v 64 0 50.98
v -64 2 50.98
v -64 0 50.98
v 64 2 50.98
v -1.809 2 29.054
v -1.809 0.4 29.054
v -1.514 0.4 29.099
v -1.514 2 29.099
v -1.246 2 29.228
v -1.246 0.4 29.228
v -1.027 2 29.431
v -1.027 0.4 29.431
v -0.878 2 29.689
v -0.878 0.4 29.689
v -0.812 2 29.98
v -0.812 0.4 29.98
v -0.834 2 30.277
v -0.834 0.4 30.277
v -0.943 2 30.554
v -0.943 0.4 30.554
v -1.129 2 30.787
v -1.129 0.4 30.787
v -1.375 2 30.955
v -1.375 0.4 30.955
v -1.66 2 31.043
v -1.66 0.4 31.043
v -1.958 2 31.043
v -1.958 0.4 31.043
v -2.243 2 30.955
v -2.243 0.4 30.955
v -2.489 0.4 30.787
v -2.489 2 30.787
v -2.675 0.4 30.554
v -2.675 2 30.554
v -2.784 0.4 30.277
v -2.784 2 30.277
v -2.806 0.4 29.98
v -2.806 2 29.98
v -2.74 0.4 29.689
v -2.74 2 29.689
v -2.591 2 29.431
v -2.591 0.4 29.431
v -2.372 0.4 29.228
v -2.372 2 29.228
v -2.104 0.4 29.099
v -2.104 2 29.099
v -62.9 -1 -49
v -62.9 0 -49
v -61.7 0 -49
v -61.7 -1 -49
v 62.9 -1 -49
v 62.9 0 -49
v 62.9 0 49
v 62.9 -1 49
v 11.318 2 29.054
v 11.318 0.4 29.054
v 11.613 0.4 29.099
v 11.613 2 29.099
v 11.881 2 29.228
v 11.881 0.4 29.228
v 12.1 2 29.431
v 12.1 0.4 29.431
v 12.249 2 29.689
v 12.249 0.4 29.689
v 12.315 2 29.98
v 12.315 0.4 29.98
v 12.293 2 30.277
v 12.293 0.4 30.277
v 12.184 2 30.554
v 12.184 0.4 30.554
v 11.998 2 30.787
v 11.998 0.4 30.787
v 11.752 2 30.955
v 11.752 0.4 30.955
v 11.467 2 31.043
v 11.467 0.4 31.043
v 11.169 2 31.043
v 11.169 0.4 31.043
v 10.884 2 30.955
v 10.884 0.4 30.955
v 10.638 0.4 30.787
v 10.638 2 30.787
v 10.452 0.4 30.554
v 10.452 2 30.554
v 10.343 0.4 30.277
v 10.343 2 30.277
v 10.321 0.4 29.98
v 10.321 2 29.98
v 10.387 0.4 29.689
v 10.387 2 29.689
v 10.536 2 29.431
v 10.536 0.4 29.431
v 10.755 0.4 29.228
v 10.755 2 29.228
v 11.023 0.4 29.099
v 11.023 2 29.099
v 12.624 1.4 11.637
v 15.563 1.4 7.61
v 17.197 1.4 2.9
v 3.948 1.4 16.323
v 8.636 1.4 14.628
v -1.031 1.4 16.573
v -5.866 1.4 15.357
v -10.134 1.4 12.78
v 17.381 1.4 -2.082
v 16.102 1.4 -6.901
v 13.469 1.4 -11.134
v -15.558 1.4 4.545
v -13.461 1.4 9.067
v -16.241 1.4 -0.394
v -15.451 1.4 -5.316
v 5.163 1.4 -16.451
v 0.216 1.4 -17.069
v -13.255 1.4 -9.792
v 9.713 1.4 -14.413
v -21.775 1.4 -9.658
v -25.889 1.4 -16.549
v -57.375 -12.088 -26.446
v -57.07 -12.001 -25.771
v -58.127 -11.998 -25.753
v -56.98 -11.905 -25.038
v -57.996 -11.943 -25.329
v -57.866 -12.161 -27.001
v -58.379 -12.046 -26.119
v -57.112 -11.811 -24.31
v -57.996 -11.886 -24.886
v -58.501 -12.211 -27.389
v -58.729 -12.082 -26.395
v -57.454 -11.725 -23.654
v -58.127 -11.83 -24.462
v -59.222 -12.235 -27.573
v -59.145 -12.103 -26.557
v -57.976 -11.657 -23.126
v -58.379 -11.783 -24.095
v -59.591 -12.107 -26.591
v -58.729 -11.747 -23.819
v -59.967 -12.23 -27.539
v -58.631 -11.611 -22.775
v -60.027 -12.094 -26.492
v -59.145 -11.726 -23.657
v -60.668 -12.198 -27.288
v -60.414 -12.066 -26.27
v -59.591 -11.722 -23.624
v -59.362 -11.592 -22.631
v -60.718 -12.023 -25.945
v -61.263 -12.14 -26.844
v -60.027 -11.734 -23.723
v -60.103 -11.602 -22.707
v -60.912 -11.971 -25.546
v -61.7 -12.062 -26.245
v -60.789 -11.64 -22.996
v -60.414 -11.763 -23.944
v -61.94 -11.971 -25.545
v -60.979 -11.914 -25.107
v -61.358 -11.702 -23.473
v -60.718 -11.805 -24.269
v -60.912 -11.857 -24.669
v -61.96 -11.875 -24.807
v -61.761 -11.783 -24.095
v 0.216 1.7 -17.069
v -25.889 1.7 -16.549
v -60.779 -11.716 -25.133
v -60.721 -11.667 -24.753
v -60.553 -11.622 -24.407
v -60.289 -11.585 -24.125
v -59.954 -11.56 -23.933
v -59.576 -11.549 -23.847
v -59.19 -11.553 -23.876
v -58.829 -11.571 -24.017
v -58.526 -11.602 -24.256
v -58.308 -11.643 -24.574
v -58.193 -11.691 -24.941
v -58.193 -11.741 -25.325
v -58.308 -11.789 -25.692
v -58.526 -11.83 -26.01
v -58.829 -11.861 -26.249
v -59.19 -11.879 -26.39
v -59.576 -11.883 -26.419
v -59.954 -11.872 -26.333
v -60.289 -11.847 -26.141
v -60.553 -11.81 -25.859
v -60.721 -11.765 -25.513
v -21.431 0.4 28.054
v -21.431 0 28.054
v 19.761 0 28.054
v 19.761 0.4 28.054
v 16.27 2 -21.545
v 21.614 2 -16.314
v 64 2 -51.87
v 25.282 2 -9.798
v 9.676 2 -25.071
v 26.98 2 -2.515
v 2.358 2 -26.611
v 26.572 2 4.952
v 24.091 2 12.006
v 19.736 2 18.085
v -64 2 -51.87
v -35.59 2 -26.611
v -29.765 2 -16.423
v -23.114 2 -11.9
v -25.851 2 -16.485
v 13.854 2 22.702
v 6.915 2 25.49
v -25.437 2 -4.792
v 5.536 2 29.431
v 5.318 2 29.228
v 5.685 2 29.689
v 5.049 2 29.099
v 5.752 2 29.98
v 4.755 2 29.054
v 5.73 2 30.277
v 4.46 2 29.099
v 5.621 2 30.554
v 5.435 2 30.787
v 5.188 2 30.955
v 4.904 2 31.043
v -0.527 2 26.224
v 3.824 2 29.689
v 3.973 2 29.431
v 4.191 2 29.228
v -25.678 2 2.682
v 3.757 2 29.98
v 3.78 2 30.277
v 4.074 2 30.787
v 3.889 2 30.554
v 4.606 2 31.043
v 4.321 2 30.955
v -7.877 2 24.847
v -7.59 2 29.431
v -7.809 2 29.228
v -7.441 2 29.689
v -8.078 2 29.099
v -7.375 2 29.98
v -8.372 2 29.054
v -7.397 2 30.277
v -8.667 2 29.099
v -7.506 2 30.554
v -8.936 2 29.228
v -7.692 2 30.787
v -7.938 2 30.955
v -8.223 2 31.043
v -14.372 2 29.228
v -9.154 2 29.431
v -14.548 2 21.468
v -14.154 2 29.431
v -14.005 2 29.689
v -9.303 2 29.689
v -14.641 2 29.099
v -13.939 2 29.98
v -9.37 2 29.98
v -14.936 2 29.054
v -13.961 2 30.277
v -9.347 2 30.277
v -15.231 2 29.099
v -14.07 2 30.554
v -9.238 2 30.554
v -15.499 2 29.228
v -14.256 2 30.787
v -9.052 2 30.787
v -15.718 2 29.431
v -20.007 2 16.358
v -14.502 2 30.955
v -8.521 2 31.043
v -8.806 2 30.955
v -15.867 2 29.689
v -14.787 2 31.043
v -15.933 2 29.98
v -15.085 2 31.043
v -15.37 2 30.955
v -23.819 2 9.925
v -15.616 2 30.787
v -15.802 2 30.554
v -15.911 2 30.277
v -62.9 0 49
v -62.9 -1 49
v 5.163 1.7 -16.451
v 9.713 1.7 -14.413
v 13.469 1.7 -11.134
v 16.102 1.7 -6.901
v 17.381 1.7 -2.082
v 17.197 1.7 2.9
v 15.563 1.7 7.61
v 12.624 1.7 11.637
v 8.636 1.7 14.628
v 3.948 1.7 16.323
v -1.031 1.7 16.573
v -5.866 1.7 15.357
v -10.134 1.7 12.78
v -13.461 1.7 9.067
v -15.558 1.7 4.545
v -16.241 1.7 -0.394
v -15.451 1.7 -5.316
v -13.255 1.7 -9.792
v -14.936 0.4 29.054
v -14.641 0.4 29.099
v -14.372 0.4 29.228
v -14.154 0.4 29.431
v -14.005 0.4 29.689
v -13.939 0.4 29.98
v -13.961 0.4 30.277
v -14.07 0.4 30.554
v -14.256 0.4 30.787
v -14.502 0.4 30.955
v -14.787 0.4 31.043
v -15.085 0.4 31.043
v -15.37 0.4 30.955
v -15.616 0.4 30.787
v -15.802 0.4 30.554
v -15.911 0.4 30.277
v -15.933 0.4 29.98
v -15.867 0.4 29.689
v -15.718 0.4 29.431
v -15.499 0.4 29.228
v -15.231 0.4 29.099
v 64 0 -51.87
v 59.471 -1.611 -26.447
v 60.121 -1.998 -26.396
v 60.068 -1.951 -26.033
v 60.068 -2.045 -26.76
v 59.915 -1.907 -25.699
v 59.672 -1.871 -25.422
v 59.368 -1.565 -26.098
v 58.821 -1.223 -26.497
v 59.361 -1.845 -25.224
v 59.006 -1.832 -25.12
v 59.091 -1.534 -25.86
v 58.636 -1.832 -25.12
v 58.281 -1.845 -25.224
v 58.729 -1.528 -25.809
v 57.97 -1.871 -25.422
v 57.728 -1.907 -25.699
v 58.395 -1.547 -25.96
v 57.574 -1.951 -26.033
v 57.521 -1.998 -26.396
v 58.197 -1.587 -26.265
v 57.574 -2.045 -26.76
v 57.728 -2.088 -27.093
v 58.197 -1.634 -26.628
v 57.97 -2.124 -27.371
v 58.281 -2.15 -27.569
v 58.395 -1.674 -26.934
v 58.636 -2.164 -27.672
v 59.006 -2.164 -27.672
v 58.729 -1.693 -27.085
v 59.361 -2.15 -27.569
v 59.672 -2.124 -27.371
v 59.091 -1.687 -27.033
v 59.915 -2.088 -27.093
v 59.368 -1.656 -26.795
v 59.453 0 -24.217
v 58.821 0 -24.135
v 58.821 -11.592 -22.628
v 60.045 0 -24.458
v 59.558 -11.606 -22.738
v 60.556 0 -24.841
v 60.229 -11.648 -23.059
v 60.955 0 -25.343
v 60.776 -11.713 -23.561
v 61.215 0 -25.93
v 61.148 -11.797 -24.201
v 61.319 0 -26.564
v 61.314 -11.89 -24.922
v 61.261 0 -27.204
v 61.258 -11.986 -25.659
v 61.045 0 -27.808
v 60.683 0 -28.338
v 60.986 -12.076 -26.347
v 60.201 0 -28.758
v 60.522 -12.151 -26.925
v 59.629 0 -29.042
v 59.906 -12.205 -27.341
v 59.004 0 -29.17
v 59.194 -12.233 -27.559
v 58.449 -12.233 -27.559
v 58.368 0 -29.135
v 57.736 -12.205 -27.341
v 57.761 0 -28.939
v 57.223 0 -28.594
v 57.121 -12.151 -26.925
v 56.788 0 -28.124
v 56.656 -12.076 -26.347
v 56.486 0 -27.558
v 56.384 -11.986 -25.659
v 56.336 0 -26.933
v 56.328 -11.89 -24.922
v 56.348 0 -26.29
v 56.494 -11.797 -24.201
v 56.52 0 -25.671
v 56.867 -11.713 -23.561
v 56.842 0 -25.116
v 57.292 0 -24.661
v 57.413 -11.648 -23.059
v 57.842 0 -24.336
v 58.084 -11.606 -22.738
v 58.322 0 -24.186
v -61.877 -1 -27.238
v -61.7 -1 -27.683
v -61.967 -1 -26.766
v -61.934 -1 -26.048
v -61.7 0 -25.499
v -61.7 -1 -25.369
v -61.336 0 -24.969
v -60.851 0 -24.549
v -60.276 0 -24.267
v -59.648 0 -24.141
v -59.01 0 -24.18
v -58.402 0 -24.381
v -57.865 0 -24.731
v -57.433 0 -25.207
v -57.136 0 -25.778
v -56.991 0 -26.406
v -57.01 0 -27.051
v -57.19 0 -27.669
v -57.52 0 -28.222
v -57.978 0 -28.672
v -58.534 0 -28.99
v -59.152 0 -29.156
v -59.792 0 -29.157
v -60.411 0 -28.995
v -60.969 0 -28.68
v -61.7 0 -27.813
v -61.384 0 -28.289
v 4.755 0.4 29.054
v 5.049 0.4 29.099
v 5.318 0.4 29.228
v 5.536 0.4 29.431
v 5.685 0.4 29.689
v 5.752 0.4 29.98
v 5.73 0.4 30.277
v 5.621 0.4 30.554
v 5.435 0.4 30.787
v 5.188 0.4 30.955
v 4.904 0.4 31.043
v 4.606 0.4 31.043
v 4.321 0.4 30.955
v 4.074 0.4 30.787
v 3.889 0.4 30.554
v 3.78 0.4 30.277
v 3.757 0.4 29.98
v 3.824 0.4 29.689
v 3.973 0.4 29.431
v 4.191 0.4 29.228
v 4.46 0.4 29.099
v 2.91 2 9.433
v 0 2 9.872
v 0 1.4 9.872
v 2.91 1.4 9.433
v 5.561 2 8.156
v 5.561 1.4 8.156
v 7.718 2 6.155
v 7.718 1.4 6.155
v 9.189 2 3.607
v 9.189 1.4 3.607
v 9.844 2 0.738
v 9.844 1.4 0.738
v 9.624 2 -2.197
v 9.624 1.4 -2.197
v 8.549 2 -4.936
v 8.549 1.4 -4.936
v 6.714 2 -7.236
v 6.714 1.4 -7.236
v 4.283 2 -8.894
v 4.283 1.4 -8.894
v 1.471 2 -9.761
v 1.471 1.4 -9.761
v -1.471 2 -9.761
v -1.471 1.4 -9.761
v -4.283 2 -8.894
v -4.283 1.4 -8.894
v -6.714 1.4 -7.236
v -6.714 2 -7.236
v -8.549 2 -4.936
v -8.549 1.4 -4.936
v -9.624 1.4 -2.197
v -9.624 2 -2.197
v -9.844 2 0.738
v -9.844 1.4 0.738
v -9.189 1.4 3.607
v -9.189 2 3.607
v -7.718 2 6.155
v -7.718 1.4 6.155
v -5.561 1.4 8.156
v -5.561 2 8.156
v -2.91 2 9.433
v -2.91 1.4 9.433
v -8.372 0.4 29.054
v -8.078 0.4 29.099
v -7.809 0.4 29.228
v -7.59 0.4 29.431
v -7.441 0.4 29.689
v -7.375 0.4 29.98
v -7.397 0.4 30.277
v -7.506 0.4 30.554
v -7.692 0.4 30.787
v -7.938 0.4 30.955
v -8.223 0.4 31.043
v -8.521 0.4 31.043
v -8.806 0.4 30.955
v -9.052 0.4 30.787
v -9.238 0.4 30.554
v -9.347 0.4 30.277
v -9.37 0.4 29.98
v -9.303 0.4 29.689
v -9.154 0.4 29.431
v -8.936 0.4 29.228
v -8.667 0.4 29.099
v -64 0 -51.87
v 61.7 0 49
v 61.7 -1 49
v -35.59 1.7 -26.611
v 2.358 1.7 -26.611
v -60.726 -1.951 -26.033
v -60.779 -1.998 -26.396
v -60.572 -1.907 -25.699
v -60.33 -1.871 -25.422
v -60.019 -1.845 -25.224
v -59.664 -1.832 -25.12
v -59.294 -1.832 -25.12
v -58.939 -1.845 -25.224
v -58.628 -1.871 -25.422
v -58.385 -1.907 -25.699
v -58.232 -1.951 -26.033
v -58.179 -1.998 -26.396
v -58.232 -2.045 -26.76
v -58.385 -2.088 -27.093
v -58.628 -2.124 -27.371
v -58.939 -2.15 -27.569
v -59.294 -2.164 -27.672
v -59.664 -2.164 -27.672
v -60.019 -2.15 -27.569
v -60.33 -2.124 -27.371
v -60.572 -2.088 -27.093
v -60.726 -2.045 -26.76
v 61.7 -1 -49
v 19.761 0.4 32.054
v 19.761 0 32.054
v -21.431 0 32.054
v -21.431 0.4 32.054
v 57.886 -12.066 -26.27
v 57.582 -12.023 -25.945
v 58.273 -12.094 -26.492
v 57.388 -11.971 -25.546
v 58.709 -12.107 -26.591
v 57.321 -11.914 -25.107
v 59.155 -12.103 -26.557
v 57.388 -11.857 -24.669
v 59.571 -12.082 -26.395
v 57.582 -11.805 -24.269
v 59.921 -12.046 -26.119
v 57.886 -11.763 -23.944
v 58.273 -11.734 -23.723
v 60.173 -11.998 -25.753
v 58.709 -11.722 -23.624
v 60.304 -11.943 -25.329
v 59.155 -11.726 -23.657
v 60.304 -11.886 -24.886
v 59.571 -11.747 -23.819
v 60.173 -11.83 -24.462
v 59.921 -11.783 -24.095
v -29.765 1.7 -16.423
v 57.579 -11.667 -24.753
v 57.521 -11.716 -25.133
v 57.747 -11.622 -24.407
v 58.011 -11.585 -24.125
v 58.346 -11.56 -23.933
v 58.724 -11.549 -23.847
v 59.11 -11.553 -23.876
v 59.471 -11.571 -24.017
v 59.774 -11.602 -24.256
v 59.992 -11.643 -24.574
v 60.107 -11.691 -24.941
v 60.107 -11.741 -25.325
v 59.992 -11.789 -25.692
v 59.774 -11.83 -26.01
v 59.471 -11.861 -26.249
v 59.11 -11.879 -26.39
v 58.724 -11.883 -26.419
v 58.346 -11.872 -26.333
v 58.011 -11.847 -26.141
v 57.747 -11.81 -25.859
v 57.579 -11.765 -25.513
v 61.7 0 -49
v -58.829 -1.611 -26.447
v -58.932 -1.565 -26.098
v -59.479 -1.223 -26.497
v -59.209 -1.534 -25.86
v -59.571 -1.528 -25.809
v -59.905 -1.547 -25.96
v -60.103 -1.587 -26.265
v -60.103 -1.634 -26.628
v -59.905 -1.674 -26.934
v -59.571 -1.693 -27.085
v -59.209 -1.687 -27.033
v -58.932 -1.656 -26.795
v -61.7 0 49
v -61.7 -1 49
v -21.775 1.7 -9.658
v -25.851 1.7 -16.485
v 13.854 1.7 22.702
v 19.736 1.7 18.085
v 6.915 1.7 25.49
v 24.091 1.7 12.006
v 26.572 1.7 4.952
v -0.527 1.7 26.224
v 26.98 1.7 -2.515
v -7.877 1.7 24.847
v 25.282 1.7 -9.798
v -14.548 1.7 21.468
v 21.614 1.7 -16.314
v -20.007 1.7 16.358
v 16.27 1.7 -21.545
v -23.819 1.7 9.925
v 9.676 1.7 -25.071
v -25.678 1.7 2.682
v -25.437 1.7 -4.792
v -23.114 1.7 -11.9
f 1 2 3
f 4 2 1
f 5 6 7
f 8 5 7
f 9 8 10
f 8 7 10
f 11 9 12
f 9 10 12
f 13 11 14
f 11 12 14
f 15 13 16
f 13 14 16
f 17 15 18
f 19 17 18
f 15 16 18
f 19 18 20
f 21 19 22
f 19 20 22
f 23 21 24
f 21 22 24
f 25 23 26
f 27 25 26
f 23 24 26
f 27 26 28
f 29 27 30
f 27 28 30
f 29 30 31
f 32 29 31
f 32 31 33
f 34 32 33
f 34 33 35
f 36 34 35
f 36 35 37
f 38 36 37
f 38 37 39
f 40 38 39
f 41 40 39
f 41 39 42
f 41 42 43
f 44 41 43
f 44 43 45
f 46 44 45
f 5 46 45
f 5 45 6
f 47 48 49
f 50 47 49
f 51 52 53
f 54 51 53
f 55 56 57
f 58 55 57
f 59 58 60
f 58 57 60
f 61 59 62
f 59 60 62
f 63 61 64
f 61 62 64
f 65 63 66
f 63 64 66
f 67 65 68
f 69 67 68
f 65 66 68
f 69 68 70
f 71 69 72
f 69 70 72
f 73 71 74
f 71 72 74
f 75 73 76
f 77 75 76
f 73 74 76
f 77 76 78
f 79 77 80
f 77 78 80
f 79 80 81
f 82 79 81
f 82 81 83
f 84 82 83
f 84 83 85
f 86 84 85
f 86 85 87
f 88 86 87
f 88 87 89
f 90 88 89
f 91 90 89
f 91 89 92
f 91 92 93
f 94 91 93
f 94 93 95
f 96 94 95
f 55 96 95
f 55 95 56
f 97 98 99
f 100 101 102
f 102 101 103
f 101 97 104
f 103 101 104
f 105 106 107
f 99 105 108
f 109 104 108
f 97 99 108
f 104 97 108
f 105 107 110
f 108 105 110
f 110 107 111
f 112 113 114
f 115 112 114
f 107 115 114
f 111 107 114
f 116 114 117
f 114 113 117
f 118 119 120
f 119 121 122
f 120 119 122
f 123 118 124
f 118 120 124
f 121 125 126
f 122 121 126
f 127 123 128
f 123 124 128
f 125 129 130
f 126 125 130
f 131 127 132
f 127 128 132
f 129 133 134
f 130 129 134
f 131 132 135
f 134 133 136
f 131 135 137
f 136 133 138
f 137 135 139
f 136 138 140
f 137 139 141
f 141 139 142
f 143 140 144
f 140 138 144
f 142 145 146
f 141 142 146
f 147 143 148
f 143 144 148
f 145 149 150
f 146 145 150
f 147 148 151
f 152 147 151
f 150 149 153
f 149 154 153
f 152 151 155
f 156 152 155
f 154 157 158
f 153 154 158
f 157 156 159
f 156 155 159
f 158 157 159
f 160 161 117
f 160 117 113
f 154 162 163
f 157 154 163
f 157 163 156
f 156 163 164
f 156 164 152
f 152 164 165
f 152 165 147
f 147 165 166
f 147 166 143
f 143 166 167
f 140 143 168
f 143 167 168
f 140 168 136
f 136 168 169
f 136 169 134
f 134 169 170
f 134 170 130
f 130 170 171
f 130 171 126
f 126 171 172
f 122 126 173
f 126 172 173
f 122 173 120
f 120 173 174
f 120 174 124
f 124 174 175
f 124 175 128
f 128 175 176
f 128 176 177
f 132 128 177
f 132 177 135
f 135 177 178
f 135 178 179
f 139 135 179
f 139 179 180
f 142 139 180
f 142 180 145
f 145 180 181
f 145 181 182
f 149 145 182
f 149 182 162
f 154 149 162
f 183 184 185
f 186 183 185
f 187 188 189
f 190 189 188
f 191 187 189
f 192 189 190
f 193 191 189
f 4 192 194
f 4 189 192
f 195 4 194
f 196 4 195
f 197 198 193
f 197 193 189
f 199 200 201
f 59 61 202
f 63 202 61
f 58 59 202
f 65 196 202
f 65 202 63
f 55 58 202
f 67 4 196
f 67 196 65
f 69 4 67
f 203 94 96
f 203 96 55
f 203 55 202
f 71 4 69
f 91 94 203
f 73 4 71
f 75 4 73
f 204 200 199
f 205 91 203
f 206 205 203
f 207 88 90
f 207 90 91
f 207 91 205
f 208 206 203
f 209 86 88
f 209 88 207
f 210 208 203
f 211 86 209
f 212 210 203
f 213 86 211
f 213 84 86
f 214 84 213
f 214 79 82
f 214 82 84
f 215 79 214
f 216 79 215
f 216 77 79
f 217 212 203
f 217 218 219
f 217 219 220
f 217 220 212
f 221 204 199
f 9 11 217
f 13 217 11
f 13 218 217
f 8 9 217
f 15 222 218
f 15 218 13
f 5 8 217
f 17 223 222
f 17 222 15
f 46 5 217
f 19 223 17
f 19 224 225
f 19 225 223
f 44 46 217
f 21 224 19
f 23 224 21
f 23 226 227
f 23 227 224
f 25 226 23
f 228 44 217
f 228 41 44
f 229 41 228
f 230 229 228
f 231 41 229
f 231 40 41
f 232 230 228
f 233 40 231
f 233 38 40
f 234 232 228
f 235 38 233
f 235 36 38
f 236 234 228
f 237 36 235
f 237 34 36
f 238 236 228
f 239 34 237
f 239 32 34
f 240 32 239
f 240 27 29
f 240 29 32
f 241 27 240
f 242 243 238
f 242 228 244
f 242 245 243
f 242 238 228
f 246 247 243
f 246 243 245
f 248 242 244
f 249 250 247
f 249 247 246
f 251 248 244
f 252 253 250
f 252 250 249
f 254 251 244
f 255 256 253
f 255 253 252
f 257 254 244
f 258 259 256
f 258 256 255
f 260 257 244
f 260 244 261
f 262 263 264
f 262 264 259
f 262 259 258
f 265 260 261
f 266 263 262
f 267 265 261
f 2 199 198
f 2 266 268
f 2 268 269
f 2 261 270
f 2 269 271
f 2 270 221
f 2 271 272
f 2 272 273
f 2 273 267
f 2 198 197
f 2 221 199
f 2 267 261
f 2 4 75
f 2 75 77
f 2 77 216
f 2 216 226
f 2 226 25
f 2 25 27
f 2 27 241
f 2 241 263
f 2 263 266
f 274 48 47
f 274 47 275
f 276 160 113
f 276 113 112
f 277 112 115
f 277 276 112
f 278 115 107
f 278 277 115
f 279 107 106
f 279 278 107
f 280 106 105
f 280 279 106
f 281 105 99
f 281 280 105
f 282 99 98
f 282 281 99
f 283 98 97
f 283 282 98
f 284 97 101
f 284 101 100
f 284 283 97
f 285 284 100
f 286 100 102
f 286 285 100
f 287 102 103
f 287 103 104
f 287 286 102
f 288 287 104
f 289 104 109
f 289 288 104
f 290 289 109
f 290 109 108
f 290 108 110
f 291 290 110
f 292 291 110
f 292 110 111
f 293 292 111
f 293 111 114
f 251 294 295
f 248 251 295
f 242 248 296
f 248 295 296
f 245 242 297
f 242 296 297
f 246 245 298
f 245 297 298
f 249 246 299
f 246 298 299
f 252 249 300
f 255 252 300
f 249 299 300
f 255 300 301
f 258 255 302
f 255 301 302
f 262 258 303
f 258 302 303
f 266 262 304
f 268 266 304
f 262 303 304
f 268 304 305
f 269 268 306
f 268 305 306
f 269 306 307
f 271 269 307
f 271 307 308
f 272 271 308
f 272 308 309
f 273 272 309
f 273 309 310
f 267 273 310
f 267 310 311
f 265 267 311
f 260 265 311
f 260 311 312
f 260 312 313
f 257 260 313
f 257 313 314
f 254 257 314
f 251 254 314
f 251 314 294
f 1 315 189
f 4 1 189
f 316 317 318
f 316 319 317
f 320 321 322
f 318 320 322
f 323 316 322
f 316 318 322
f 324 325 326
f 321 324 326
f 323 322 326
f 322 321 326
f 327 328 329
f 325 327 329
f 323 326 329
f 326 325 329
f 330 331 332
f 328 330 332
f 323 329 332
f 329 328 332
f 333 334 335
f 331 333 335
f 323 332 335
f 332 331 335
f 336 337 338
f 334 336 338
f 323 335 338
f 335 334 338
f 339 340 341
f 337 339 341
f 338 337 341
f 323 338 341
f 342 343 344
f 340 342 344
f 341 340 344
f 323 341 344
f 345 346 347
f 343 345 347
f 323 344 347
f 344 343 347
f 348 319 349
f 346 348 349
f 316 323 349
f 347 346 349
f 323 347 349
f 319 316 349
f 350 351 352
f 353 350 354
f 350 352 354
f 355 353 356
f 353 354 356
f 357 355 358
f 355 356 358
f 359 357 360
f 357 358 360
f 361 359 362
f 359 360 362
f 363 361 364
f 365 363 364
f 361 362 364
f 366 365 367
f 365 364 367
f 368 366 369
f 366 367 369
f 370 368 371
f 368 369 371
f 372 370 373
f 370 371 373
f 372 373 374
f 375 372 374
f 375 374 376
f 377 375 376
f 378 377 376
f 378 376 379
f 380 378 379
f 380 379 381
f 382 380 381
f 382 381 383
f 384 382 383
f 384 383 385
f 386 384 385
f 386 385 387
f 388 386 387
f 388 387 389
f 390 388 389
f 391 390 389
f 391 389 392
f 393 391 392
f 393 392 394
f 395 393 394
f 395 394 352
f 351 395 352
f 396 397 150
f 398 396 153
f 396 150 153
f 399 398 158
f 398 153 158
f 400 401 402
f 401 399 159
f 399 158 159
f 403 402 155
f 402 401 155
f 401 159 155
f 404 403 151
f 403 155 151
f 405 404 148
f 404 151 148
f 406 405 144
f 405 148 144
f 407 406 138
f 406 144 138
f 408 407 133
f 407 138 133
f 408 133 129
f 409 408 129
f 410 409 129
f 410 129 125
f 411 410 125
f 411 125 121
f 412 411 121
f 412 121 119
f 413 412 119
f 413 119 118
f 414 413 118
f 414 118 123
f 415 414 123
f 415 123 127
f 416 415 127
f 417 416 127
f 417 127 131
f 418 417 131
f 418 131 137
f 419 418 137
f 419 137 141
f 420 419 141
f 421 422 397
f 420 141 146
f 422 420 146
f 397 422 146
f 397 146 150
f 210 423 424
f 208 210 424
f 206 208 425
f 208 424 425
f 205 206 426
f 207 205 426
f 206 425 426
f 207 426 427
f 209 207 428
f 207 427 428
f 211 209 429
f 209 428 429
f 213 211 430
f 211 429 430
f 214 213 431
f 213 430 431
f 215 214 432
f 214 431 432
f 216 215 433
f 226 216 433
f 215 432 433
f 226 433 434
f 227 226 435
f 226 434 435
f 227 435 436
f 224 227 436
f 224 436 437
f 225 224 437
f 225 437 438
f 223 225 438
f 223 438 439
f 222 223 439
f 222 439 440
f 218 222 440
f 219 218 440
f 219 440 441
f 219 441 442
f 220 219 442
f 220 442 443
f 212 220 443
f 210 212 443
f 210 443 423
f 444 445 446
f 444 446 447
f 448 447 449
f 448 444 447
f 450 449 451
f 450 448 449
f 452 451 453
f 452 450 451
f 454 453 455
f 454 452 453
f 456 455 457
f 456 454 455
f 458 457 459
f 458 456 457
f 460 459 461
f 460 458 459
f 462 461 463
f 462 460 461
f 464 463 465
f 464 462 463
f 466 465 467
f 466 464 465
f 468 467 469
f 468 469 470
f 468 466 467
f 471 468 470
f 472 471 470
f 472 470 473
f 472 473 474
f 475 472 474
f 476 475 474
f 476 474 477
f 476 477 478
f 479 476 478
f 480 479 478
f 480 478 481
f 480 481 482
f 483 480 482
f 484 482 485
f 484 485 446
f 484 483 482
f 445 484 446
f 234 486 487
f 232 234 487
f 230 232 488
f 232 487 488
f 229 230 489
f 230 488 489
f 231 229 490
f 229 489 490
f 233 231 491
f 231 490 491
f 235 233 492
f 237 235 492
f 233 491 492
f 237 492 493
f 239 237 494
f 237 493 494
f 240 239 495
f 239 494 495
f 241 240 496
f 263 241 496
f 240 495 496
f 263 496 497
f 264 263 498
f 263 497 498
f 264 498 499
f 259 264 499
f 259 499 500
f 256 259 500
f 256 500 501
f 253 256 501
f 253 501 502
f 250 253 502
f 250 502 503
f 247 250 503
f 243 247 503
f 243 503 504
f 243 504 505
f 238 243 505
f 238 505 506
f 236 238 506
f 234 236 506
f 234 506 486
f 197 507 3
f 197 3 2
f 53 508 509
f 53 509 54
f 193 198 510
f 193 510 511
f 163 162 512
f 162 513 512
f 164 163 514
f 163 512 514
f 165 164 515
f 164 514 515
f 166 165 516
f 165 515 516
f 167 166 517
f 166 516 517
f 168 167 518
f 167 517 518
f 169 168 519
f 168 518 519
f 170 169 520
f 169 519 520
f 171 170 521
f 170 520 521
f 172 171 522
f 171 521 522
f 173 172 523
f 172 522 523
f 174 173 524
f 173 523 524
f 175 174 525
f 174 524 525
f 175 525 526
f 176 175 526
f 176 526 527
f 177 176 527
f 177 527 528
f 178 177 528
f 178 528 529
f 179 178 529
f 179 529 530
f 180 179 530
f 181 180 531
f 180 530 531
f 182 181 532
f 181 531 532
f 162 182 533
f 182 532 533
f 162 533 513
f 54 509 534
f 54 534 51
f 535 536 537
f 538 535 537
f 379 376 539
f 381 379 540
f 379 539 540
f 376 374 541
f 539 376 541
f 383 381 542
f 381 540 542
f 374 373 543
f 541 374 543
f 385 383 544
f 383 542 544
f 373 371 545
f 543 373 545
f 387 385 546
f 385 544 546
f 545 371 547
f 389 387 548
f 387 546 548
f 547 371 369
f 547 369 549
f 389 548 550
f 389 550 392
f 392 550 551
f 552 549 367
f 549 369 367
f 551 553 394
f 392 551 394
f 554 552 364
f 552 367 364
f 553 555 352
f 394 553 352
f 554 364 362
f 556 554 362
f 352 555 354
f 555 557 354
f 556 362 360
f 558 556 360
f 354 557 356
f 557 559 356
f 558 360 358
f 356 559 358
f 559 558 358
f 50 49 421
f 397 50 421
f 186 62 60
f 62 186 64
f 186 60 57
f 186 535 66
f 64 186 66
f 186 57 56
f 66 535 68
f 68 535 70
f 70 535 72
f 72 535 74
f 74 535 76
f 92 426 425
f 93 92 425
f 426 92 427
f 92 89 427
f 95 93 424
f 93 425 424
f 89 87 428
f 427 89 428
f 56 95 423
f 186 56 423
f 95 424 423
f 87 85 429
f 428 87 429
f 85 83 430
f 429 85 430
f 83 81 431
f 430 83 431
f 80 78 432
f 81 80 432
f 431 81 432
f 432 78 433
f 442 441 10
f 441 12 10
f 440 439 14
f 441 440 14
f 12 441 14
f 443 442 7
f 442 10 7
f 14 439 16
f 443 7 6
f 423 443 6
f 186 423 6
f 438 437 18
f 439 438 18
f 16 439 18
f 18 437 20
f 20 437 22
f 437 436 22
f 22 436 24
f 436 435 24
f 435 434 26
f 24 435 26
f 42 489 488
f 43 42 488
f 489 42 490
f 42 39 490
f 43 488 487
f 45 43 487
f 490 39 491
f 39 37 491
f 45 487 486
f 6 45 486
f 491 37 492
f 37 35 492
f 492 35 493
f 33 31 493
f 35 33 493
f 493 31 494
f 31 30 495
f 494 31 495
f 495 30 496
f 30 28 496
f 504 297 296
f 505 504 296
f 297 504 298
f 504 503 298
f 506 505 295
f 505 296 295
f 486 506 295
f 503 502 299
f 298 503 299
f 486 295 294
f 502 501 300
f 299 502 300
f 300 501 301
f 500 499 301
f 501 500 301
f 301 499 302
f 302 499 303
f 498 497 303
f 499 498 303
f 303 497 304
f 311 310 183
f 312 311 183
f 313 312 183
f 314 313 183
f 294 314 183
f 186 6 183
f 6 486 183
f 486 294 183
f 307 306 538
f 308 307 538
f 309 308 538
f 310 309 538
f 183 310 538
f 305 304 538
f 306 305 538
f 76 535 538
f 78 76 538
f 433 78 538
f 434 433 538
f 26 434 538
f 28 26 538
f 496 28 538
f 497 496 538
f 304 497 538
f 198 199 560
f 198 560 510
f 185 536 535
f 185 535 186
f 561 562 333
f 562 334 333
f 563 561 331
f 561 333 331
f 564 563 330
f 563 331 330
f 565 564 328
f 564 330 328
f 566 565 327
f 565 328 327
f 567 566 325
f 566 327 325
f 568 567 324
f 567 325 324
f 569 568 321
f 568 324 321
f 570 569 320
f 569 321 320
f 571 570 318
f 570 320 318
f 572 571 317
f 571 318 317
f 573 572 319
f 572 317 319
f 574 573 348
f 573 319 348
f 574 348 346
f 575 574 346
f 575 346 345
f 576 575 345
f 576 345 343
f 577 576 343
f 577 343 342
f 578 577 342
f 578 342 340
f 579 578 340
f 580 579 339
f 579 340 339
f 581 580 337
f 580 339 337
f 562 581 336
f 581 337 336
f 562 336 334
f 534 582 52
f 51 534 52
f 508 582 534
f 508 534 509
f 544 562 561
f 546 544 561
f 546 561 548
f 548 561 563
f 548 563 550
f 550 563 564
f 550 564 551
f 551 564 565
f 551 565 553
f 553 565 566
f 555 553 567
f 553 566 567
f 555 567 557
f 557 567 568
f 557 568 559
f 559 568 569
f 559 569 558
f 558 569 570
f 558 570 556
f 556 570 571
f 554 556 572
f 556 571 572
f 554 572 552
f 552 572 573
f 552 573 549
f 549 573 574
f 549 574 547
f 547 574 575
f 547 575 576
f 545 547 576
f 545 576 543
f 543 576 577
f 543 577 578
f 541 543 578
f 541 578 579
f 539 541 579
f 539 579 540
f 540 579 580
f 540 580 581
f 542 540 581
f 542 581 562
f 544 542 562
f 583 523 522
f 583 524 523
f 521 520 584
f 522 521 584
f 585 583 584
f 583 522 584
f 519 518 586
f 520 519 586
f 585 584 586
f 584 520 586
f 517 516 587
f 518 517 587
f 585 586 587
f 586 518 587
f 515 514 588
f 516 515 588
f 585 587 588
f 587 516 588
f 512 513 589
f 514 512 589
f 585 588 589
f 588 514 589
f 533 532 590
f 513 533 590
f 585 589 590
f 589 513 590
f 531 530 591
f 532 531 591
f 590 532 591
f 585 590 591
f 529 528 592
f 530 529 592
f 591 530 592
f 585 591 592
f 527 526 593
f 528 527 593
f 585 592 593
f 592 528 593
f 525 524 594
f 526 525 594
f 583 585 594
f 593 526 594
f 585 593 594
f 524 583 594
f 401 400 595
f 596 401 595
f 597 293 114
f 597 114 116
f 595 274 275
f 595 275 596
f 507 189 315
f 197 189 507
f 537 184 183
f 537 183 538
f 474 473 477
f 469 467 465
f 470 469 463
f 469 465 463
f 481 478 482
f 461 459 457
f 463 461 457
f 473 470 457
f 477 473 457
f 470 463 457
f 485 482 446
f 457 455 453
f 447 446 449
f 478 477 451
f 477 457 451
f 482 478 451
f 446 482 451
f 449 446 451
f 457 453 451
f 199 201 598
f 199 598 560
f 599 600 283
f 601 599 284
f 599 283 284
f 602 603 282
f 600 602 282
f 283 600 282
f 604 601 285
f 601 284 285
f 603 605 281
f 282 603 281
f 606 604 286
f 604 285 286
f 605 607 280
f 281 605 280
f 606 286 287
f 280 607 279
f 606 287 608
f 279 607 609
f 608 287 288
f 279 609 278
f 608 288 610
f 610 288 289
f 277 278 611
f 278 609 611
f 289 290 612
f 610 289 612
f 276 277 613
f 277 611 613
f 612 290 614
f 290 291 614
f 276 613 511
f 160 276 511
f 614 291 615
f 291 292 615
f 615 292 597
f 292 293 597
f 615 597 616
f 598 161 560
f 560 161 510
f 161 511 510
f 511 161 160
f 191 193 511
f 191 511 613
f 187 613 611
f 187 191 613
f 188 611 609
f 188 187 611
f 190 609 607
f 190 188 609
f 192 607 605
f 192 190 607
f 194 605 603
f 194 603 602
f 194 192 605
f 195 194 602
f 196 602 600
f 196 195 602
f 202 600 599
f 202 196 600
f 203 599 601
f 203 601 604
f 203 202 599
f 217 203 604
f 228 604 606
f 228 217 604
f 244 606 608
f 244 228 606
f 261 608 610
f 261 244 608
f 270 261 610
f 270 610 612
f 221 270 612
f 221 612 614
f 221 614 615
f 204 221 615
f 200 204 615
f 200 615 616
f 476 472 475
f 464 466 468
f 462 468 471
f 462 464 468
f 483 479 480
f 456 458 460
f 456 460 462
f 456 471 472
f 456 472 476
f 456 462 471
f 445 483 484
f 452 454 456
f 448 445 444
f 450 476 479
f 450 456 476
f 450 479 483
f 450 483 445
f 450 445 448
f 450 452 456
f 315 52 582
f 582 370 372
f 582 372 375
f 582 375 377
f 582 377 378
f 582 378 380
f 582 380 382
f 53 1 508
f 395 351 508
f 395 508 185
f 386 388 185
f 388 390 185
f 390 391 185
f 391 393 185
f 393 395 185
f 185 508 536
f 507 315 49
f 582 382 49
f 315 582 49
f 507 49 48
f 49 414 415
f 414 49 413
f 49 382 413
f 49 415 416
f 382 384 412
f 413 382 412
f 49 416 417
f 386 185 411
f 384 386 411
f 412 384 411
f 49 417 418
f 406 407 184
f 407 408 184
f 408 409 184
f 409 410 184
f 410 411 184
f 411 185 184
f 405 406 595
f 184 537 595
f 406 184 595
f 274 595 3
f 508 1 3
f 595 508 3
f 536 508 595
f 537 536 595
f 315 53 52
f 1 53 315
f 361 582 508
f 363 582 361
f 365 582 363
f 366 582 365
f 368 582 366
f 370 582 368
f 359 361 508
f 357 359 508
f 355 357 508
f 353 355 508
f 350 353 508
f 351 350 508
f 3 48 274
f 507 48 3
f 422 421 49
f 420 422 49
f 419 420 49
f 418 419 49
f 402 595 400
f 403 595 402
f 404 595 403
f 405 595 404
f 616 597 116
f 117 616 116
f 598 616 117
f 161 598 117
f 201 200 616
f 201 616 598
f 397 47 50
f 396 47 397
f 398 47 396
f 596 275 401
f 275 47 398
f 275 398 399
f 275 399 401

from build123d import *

# Parameters (mm, degrees)
SKETCH1_W                      = 128
SKETCH1_H                      = 101
BOSS_EXTRUDE1_DEPTH            = 2
SKETCH2_W                      = 1.2
SKETCH2_H                      = 98
BOSS_EXTRUDE2_DEPTH            = 1
SKETCH3_W                      = 128
SKETCH3_H                      = 2
BOSS_EXTRUDE3_DEPTH            = 0.48
SKETCH4_W                      = 128
SKETCH4_H                      = 2
BOSS_EXTRUDE4_DEPTH            = 1.37
BOSS_EXTRUDE5_START            = 2
SKETCH5_R                      = 2.5
BOSS_EXTRUDE5_DEPTH            = 13
M3_CLEARANCE_HOLE1_D           = 2.6
M3_CLEARANCE_HOLE1_DEPTH       = 10
M3_CLEARANCE_HOLE1_CSINK_D     = 3
M3_CLEARANCE_HOLE1_CSINK_ANGLE = 90
M3_CLEARANCE_HOLE1_TIP         = 0.781118805
M3_CLEARANCE_HOLE2_D           = 2.6
M3_CLEARANCE_HOLE2_DEPTH       = 10
M3_CLEARANCE_HOLE2_CSINK_D     = 3
M3_CLEARANCE_HOLE2_CSINK_ANGLE = 90
M3_CLEARANCE_HOLE2_TIP         = 0.781118805
SKETCH14_R                     = 1
CUT_EXTRUDE1_DEPTH             = 5
CUT_EXTRUDE2_DEPTH             = 0.4
CUT_EXTRUDE4_DEPTH             = 0.3
CUT_EXTRUDE5_DEPTH             = 0.6
SKETCH30_R                     = 9.871633986
BOSS_EXTRUDE13_DEPTH           = 0.6


with BuildPart() as part:
    # Sketch1 → Boss-Extrude1 (new body)
    with BuildSketch(Plane(origin=(0, 0, 0), x_dir=(1, 0, 0), z_dir=(0, 1, 0))):
        Rectangle(SKETCH1_W, SKETCH1_H)
    extrude(amount=BOSS_EXTRUDE1_DEPTH)

    # Sketch2 → Boss-Extrude2 (add)
    with BuildSketch(Plane.XZ):
        with Locations((62.3, 0)):
            Rectangle(SKETCH2_W, SKETCH2_H)
        with Locations((-62.3, 0)):
            Rectangle(SKETCH2_W, SKETCH2_H)
    extrude(amount=BOSS_EXTRUDE2_DEPTH)

    # Sketch3 → Boss-Extrude3 (add)
    with BuildSketch(Plane.XY.offset(50.5)):
        with Locations((0, 1)):
            Rectangle(SKETCH3_W, SKETCH3_H)
    extrude(amount=BOSS_EXTRUDE3_DEPTH)

    # Sketch4 → Boss-Extrude4 (add)
    with BuildSketch(Plane(origin=(0, 0, -50.5), x_dir=(-1, 0, 0), z_dir=(0, 0, -1))):
        with Locations((0, 1)):
            Rectangle(SKETCH4_W, SKETCH4_H)
    extrude(amount=BOSS_EXTRUDE4_DEPTH)

    # Sketch5 → Boss-Extrude5 (add)
    with BuildSketch(Plane(origin=(0, -10.49000593, 1.363700771), x_dir=(1, 0, 0), z_dir=(0, 0.9916556173432378, -0.12891523025462098)).offset(BOSS_EXTRUDE5_START)):
        with Locations(Location((-59.478852689, 26.433660117, 0), (0, 0, 152.68023031))):
            Circle(SKETCH5_R)
        with Locations(Location((58.821147316, 26.433660117, 0), (0, 0, 270))):
            Circle(SKETCH5_R)
    extrude(amount=BOSS_EXTRUDE5_DEPTH)

    # M3 Clearance Hole1
    with Locations(Plane(origin=(0, -8.506694695, 1.10587031), x_dir=(1, 0, 0), z_dir=(0, -0.9916556173432378, 0.12891523025462098))):
        with Locations((58.821147316, -26.433660117)):
            CounterSinkHole(M3_CLEARANCE_HOLE1_D / 2, M3_CLEARANCE_HOLE1_CSINK_D / 2, depth=M3_CLEARANCE_HOLE1_DEPTH, counter_sink_angle=M3_CLEARANCE_HOLE1_CSINK_ANGLE)
            with Locations((0, 0, -(M3_CLEARANCE_HOLE1_DEPTH + M3_CLEARANCE_HOLE1_TIP / 2))):  # 118° drill point
                Cone(0, M3_CLEARANCE_HOLE1_D / 2, M3_CLEARANCE_HOLE1_TIP, mode=Mode.SUBTRACT)

    # M3 Clearance Hole2
    with Locations(Plane(origin=(0, -8.506694695, 1.10587031), x_dir=(1, 0, 0), z_dir=(0, -0.9916556173432378, 0.12891523025462098))):
        with Locations((-59.478852689, -26.433660117)):
            CounterSinkHole(M3_CLEARANCE_HOLE2_D / 2, M3_CLEARANCE_HOLE2_CSINK_D / 2, depth=M3_CLEARANCE_HOLE2_DEPTH, counter_sink_angle=M3_CLEARANCE_HOLE2_CSINK_ANGLE)
            with Locations((0, 0, -(M3_CLEARANCE_HOLE2_DEPTH + M3_CLEARANCE_HOLE2_TIP / 2))):  # 118° drill point
                Cone(0, M3_CLEARANCE_HOLE2_D / 2, M3_CLEARANCE_HOLE2_TIP, mode=Mode.SUBTRACT)

    # Sketch14 → Cut-Extrude1 (cut)
    with BuildSketch(Plane.XZ):
        with Locations(Location((-8.372305841, 30.05428165, 0), (0, 0, 270))):
            Circle(SKETCH14_R)
        with Locations(Location((4.754600466, 30.05428165, 0), (0, 0, 270))):
            Circle(SKETCH14_R)
        with Locations(Location((11.318053619, 30.05428165, 0), (0, 0, 270))):
            Circle(SKETCH14_R)
        with Locations(Location((-14.935758995, 30.05428165, 0), (0, 0, 270))):
            Circle(SKETCH14_R)
        with Locations(Location((-1.808852688, 30.05428165, 0), (0, 0, 270))):
            Circle(SKETCH14_R)
    extrude(amount=-CUT_EXTRUDE1_DEPTH, mode=Mode.SUBTRACT)

    # Sketch15 → Cut-Extrude2 (cut)
    with BuildSketch(Plane.XZ):
        Polygon((-16.43147406, 32.05428165), (14.761074601, 32.05428165), (19.761074601, 32.05428165), (19.761074601, 28.05428165), (14.761074601, 28.05428165), (-16.43147406, 28.05428165), (-21.43147406, 28.05428165), (-21.43147406, 32.05428165), align=None)
    extrude(amount=-CUT_EXTRUDE2_DEPTH, mode=Mode.SUBTRACT)

    # Sketch31 → Cut-Extrude4 (cut)
    with BuildSketch(Plane(origin=(0, 2, 0), x_dir=(1, 0, 0), z_dir=(0, 1, 0))):
        with BuildLine():
            Line((-35.589637389, 26.611090632), (2.358171766, 26.611090632))
            ThreePointArc((2.358171766, 26.611090632), (11.389438086, -23.958753128), (-20.168517513, 16.574792334))
            Line((-20.168517513, 16.574792334), (-29.764841633, 16.423494794))
            Line((-29.764841633, 16.423494794), (-35.589637389, 26.611090632))
        make_face()
    extrude(amount=-CUT_EXTRUDE4_DEPTH, mode=Mode.SUBTRACT)

    # Sketch29 → Cut-Extrude5 (cut)
    with BuildSketch(Plane(origin=(0, 2, 0), x_dir=(1, 0, 0), z_dir=(0, 1, 0))):
        with BuildLine():
            Line((-25.889090528, 16.549174918), (0.216418019, 17.068757453))
            ThreePointArc((0.216418019, 17.068757453), (8.636281726, -14.628247298), (-13.255238872, 9.79214461))
            Line((-13.255238872, 9.79214461), (-21.775344713, 9.65781494))
            Line((-21.775344713, 9.65781494), (-25.889090528, 16.549174918))
        make_face()
    extrude(amount=-CUT_EXTRUDE5_DEPTH, mode=Mode.SUBTRACT)


with BuildPart() as body_2:
    # Sketch30 → Boss-Extrude13 (new body)
    with BuildSketch(Plane(origin=(0, 2, 0), x_dir=(1, 0, 0), z_dir=(0, 1, 0))):
        with Locations(Location((0, 0, 0), (0, 0, 270))):
            Circle(SKETCH30_R)
    extrude(amount=-BOSS_EXTRUDE13_DEPTH)


solid = Compound([part.part, body_2.part])
